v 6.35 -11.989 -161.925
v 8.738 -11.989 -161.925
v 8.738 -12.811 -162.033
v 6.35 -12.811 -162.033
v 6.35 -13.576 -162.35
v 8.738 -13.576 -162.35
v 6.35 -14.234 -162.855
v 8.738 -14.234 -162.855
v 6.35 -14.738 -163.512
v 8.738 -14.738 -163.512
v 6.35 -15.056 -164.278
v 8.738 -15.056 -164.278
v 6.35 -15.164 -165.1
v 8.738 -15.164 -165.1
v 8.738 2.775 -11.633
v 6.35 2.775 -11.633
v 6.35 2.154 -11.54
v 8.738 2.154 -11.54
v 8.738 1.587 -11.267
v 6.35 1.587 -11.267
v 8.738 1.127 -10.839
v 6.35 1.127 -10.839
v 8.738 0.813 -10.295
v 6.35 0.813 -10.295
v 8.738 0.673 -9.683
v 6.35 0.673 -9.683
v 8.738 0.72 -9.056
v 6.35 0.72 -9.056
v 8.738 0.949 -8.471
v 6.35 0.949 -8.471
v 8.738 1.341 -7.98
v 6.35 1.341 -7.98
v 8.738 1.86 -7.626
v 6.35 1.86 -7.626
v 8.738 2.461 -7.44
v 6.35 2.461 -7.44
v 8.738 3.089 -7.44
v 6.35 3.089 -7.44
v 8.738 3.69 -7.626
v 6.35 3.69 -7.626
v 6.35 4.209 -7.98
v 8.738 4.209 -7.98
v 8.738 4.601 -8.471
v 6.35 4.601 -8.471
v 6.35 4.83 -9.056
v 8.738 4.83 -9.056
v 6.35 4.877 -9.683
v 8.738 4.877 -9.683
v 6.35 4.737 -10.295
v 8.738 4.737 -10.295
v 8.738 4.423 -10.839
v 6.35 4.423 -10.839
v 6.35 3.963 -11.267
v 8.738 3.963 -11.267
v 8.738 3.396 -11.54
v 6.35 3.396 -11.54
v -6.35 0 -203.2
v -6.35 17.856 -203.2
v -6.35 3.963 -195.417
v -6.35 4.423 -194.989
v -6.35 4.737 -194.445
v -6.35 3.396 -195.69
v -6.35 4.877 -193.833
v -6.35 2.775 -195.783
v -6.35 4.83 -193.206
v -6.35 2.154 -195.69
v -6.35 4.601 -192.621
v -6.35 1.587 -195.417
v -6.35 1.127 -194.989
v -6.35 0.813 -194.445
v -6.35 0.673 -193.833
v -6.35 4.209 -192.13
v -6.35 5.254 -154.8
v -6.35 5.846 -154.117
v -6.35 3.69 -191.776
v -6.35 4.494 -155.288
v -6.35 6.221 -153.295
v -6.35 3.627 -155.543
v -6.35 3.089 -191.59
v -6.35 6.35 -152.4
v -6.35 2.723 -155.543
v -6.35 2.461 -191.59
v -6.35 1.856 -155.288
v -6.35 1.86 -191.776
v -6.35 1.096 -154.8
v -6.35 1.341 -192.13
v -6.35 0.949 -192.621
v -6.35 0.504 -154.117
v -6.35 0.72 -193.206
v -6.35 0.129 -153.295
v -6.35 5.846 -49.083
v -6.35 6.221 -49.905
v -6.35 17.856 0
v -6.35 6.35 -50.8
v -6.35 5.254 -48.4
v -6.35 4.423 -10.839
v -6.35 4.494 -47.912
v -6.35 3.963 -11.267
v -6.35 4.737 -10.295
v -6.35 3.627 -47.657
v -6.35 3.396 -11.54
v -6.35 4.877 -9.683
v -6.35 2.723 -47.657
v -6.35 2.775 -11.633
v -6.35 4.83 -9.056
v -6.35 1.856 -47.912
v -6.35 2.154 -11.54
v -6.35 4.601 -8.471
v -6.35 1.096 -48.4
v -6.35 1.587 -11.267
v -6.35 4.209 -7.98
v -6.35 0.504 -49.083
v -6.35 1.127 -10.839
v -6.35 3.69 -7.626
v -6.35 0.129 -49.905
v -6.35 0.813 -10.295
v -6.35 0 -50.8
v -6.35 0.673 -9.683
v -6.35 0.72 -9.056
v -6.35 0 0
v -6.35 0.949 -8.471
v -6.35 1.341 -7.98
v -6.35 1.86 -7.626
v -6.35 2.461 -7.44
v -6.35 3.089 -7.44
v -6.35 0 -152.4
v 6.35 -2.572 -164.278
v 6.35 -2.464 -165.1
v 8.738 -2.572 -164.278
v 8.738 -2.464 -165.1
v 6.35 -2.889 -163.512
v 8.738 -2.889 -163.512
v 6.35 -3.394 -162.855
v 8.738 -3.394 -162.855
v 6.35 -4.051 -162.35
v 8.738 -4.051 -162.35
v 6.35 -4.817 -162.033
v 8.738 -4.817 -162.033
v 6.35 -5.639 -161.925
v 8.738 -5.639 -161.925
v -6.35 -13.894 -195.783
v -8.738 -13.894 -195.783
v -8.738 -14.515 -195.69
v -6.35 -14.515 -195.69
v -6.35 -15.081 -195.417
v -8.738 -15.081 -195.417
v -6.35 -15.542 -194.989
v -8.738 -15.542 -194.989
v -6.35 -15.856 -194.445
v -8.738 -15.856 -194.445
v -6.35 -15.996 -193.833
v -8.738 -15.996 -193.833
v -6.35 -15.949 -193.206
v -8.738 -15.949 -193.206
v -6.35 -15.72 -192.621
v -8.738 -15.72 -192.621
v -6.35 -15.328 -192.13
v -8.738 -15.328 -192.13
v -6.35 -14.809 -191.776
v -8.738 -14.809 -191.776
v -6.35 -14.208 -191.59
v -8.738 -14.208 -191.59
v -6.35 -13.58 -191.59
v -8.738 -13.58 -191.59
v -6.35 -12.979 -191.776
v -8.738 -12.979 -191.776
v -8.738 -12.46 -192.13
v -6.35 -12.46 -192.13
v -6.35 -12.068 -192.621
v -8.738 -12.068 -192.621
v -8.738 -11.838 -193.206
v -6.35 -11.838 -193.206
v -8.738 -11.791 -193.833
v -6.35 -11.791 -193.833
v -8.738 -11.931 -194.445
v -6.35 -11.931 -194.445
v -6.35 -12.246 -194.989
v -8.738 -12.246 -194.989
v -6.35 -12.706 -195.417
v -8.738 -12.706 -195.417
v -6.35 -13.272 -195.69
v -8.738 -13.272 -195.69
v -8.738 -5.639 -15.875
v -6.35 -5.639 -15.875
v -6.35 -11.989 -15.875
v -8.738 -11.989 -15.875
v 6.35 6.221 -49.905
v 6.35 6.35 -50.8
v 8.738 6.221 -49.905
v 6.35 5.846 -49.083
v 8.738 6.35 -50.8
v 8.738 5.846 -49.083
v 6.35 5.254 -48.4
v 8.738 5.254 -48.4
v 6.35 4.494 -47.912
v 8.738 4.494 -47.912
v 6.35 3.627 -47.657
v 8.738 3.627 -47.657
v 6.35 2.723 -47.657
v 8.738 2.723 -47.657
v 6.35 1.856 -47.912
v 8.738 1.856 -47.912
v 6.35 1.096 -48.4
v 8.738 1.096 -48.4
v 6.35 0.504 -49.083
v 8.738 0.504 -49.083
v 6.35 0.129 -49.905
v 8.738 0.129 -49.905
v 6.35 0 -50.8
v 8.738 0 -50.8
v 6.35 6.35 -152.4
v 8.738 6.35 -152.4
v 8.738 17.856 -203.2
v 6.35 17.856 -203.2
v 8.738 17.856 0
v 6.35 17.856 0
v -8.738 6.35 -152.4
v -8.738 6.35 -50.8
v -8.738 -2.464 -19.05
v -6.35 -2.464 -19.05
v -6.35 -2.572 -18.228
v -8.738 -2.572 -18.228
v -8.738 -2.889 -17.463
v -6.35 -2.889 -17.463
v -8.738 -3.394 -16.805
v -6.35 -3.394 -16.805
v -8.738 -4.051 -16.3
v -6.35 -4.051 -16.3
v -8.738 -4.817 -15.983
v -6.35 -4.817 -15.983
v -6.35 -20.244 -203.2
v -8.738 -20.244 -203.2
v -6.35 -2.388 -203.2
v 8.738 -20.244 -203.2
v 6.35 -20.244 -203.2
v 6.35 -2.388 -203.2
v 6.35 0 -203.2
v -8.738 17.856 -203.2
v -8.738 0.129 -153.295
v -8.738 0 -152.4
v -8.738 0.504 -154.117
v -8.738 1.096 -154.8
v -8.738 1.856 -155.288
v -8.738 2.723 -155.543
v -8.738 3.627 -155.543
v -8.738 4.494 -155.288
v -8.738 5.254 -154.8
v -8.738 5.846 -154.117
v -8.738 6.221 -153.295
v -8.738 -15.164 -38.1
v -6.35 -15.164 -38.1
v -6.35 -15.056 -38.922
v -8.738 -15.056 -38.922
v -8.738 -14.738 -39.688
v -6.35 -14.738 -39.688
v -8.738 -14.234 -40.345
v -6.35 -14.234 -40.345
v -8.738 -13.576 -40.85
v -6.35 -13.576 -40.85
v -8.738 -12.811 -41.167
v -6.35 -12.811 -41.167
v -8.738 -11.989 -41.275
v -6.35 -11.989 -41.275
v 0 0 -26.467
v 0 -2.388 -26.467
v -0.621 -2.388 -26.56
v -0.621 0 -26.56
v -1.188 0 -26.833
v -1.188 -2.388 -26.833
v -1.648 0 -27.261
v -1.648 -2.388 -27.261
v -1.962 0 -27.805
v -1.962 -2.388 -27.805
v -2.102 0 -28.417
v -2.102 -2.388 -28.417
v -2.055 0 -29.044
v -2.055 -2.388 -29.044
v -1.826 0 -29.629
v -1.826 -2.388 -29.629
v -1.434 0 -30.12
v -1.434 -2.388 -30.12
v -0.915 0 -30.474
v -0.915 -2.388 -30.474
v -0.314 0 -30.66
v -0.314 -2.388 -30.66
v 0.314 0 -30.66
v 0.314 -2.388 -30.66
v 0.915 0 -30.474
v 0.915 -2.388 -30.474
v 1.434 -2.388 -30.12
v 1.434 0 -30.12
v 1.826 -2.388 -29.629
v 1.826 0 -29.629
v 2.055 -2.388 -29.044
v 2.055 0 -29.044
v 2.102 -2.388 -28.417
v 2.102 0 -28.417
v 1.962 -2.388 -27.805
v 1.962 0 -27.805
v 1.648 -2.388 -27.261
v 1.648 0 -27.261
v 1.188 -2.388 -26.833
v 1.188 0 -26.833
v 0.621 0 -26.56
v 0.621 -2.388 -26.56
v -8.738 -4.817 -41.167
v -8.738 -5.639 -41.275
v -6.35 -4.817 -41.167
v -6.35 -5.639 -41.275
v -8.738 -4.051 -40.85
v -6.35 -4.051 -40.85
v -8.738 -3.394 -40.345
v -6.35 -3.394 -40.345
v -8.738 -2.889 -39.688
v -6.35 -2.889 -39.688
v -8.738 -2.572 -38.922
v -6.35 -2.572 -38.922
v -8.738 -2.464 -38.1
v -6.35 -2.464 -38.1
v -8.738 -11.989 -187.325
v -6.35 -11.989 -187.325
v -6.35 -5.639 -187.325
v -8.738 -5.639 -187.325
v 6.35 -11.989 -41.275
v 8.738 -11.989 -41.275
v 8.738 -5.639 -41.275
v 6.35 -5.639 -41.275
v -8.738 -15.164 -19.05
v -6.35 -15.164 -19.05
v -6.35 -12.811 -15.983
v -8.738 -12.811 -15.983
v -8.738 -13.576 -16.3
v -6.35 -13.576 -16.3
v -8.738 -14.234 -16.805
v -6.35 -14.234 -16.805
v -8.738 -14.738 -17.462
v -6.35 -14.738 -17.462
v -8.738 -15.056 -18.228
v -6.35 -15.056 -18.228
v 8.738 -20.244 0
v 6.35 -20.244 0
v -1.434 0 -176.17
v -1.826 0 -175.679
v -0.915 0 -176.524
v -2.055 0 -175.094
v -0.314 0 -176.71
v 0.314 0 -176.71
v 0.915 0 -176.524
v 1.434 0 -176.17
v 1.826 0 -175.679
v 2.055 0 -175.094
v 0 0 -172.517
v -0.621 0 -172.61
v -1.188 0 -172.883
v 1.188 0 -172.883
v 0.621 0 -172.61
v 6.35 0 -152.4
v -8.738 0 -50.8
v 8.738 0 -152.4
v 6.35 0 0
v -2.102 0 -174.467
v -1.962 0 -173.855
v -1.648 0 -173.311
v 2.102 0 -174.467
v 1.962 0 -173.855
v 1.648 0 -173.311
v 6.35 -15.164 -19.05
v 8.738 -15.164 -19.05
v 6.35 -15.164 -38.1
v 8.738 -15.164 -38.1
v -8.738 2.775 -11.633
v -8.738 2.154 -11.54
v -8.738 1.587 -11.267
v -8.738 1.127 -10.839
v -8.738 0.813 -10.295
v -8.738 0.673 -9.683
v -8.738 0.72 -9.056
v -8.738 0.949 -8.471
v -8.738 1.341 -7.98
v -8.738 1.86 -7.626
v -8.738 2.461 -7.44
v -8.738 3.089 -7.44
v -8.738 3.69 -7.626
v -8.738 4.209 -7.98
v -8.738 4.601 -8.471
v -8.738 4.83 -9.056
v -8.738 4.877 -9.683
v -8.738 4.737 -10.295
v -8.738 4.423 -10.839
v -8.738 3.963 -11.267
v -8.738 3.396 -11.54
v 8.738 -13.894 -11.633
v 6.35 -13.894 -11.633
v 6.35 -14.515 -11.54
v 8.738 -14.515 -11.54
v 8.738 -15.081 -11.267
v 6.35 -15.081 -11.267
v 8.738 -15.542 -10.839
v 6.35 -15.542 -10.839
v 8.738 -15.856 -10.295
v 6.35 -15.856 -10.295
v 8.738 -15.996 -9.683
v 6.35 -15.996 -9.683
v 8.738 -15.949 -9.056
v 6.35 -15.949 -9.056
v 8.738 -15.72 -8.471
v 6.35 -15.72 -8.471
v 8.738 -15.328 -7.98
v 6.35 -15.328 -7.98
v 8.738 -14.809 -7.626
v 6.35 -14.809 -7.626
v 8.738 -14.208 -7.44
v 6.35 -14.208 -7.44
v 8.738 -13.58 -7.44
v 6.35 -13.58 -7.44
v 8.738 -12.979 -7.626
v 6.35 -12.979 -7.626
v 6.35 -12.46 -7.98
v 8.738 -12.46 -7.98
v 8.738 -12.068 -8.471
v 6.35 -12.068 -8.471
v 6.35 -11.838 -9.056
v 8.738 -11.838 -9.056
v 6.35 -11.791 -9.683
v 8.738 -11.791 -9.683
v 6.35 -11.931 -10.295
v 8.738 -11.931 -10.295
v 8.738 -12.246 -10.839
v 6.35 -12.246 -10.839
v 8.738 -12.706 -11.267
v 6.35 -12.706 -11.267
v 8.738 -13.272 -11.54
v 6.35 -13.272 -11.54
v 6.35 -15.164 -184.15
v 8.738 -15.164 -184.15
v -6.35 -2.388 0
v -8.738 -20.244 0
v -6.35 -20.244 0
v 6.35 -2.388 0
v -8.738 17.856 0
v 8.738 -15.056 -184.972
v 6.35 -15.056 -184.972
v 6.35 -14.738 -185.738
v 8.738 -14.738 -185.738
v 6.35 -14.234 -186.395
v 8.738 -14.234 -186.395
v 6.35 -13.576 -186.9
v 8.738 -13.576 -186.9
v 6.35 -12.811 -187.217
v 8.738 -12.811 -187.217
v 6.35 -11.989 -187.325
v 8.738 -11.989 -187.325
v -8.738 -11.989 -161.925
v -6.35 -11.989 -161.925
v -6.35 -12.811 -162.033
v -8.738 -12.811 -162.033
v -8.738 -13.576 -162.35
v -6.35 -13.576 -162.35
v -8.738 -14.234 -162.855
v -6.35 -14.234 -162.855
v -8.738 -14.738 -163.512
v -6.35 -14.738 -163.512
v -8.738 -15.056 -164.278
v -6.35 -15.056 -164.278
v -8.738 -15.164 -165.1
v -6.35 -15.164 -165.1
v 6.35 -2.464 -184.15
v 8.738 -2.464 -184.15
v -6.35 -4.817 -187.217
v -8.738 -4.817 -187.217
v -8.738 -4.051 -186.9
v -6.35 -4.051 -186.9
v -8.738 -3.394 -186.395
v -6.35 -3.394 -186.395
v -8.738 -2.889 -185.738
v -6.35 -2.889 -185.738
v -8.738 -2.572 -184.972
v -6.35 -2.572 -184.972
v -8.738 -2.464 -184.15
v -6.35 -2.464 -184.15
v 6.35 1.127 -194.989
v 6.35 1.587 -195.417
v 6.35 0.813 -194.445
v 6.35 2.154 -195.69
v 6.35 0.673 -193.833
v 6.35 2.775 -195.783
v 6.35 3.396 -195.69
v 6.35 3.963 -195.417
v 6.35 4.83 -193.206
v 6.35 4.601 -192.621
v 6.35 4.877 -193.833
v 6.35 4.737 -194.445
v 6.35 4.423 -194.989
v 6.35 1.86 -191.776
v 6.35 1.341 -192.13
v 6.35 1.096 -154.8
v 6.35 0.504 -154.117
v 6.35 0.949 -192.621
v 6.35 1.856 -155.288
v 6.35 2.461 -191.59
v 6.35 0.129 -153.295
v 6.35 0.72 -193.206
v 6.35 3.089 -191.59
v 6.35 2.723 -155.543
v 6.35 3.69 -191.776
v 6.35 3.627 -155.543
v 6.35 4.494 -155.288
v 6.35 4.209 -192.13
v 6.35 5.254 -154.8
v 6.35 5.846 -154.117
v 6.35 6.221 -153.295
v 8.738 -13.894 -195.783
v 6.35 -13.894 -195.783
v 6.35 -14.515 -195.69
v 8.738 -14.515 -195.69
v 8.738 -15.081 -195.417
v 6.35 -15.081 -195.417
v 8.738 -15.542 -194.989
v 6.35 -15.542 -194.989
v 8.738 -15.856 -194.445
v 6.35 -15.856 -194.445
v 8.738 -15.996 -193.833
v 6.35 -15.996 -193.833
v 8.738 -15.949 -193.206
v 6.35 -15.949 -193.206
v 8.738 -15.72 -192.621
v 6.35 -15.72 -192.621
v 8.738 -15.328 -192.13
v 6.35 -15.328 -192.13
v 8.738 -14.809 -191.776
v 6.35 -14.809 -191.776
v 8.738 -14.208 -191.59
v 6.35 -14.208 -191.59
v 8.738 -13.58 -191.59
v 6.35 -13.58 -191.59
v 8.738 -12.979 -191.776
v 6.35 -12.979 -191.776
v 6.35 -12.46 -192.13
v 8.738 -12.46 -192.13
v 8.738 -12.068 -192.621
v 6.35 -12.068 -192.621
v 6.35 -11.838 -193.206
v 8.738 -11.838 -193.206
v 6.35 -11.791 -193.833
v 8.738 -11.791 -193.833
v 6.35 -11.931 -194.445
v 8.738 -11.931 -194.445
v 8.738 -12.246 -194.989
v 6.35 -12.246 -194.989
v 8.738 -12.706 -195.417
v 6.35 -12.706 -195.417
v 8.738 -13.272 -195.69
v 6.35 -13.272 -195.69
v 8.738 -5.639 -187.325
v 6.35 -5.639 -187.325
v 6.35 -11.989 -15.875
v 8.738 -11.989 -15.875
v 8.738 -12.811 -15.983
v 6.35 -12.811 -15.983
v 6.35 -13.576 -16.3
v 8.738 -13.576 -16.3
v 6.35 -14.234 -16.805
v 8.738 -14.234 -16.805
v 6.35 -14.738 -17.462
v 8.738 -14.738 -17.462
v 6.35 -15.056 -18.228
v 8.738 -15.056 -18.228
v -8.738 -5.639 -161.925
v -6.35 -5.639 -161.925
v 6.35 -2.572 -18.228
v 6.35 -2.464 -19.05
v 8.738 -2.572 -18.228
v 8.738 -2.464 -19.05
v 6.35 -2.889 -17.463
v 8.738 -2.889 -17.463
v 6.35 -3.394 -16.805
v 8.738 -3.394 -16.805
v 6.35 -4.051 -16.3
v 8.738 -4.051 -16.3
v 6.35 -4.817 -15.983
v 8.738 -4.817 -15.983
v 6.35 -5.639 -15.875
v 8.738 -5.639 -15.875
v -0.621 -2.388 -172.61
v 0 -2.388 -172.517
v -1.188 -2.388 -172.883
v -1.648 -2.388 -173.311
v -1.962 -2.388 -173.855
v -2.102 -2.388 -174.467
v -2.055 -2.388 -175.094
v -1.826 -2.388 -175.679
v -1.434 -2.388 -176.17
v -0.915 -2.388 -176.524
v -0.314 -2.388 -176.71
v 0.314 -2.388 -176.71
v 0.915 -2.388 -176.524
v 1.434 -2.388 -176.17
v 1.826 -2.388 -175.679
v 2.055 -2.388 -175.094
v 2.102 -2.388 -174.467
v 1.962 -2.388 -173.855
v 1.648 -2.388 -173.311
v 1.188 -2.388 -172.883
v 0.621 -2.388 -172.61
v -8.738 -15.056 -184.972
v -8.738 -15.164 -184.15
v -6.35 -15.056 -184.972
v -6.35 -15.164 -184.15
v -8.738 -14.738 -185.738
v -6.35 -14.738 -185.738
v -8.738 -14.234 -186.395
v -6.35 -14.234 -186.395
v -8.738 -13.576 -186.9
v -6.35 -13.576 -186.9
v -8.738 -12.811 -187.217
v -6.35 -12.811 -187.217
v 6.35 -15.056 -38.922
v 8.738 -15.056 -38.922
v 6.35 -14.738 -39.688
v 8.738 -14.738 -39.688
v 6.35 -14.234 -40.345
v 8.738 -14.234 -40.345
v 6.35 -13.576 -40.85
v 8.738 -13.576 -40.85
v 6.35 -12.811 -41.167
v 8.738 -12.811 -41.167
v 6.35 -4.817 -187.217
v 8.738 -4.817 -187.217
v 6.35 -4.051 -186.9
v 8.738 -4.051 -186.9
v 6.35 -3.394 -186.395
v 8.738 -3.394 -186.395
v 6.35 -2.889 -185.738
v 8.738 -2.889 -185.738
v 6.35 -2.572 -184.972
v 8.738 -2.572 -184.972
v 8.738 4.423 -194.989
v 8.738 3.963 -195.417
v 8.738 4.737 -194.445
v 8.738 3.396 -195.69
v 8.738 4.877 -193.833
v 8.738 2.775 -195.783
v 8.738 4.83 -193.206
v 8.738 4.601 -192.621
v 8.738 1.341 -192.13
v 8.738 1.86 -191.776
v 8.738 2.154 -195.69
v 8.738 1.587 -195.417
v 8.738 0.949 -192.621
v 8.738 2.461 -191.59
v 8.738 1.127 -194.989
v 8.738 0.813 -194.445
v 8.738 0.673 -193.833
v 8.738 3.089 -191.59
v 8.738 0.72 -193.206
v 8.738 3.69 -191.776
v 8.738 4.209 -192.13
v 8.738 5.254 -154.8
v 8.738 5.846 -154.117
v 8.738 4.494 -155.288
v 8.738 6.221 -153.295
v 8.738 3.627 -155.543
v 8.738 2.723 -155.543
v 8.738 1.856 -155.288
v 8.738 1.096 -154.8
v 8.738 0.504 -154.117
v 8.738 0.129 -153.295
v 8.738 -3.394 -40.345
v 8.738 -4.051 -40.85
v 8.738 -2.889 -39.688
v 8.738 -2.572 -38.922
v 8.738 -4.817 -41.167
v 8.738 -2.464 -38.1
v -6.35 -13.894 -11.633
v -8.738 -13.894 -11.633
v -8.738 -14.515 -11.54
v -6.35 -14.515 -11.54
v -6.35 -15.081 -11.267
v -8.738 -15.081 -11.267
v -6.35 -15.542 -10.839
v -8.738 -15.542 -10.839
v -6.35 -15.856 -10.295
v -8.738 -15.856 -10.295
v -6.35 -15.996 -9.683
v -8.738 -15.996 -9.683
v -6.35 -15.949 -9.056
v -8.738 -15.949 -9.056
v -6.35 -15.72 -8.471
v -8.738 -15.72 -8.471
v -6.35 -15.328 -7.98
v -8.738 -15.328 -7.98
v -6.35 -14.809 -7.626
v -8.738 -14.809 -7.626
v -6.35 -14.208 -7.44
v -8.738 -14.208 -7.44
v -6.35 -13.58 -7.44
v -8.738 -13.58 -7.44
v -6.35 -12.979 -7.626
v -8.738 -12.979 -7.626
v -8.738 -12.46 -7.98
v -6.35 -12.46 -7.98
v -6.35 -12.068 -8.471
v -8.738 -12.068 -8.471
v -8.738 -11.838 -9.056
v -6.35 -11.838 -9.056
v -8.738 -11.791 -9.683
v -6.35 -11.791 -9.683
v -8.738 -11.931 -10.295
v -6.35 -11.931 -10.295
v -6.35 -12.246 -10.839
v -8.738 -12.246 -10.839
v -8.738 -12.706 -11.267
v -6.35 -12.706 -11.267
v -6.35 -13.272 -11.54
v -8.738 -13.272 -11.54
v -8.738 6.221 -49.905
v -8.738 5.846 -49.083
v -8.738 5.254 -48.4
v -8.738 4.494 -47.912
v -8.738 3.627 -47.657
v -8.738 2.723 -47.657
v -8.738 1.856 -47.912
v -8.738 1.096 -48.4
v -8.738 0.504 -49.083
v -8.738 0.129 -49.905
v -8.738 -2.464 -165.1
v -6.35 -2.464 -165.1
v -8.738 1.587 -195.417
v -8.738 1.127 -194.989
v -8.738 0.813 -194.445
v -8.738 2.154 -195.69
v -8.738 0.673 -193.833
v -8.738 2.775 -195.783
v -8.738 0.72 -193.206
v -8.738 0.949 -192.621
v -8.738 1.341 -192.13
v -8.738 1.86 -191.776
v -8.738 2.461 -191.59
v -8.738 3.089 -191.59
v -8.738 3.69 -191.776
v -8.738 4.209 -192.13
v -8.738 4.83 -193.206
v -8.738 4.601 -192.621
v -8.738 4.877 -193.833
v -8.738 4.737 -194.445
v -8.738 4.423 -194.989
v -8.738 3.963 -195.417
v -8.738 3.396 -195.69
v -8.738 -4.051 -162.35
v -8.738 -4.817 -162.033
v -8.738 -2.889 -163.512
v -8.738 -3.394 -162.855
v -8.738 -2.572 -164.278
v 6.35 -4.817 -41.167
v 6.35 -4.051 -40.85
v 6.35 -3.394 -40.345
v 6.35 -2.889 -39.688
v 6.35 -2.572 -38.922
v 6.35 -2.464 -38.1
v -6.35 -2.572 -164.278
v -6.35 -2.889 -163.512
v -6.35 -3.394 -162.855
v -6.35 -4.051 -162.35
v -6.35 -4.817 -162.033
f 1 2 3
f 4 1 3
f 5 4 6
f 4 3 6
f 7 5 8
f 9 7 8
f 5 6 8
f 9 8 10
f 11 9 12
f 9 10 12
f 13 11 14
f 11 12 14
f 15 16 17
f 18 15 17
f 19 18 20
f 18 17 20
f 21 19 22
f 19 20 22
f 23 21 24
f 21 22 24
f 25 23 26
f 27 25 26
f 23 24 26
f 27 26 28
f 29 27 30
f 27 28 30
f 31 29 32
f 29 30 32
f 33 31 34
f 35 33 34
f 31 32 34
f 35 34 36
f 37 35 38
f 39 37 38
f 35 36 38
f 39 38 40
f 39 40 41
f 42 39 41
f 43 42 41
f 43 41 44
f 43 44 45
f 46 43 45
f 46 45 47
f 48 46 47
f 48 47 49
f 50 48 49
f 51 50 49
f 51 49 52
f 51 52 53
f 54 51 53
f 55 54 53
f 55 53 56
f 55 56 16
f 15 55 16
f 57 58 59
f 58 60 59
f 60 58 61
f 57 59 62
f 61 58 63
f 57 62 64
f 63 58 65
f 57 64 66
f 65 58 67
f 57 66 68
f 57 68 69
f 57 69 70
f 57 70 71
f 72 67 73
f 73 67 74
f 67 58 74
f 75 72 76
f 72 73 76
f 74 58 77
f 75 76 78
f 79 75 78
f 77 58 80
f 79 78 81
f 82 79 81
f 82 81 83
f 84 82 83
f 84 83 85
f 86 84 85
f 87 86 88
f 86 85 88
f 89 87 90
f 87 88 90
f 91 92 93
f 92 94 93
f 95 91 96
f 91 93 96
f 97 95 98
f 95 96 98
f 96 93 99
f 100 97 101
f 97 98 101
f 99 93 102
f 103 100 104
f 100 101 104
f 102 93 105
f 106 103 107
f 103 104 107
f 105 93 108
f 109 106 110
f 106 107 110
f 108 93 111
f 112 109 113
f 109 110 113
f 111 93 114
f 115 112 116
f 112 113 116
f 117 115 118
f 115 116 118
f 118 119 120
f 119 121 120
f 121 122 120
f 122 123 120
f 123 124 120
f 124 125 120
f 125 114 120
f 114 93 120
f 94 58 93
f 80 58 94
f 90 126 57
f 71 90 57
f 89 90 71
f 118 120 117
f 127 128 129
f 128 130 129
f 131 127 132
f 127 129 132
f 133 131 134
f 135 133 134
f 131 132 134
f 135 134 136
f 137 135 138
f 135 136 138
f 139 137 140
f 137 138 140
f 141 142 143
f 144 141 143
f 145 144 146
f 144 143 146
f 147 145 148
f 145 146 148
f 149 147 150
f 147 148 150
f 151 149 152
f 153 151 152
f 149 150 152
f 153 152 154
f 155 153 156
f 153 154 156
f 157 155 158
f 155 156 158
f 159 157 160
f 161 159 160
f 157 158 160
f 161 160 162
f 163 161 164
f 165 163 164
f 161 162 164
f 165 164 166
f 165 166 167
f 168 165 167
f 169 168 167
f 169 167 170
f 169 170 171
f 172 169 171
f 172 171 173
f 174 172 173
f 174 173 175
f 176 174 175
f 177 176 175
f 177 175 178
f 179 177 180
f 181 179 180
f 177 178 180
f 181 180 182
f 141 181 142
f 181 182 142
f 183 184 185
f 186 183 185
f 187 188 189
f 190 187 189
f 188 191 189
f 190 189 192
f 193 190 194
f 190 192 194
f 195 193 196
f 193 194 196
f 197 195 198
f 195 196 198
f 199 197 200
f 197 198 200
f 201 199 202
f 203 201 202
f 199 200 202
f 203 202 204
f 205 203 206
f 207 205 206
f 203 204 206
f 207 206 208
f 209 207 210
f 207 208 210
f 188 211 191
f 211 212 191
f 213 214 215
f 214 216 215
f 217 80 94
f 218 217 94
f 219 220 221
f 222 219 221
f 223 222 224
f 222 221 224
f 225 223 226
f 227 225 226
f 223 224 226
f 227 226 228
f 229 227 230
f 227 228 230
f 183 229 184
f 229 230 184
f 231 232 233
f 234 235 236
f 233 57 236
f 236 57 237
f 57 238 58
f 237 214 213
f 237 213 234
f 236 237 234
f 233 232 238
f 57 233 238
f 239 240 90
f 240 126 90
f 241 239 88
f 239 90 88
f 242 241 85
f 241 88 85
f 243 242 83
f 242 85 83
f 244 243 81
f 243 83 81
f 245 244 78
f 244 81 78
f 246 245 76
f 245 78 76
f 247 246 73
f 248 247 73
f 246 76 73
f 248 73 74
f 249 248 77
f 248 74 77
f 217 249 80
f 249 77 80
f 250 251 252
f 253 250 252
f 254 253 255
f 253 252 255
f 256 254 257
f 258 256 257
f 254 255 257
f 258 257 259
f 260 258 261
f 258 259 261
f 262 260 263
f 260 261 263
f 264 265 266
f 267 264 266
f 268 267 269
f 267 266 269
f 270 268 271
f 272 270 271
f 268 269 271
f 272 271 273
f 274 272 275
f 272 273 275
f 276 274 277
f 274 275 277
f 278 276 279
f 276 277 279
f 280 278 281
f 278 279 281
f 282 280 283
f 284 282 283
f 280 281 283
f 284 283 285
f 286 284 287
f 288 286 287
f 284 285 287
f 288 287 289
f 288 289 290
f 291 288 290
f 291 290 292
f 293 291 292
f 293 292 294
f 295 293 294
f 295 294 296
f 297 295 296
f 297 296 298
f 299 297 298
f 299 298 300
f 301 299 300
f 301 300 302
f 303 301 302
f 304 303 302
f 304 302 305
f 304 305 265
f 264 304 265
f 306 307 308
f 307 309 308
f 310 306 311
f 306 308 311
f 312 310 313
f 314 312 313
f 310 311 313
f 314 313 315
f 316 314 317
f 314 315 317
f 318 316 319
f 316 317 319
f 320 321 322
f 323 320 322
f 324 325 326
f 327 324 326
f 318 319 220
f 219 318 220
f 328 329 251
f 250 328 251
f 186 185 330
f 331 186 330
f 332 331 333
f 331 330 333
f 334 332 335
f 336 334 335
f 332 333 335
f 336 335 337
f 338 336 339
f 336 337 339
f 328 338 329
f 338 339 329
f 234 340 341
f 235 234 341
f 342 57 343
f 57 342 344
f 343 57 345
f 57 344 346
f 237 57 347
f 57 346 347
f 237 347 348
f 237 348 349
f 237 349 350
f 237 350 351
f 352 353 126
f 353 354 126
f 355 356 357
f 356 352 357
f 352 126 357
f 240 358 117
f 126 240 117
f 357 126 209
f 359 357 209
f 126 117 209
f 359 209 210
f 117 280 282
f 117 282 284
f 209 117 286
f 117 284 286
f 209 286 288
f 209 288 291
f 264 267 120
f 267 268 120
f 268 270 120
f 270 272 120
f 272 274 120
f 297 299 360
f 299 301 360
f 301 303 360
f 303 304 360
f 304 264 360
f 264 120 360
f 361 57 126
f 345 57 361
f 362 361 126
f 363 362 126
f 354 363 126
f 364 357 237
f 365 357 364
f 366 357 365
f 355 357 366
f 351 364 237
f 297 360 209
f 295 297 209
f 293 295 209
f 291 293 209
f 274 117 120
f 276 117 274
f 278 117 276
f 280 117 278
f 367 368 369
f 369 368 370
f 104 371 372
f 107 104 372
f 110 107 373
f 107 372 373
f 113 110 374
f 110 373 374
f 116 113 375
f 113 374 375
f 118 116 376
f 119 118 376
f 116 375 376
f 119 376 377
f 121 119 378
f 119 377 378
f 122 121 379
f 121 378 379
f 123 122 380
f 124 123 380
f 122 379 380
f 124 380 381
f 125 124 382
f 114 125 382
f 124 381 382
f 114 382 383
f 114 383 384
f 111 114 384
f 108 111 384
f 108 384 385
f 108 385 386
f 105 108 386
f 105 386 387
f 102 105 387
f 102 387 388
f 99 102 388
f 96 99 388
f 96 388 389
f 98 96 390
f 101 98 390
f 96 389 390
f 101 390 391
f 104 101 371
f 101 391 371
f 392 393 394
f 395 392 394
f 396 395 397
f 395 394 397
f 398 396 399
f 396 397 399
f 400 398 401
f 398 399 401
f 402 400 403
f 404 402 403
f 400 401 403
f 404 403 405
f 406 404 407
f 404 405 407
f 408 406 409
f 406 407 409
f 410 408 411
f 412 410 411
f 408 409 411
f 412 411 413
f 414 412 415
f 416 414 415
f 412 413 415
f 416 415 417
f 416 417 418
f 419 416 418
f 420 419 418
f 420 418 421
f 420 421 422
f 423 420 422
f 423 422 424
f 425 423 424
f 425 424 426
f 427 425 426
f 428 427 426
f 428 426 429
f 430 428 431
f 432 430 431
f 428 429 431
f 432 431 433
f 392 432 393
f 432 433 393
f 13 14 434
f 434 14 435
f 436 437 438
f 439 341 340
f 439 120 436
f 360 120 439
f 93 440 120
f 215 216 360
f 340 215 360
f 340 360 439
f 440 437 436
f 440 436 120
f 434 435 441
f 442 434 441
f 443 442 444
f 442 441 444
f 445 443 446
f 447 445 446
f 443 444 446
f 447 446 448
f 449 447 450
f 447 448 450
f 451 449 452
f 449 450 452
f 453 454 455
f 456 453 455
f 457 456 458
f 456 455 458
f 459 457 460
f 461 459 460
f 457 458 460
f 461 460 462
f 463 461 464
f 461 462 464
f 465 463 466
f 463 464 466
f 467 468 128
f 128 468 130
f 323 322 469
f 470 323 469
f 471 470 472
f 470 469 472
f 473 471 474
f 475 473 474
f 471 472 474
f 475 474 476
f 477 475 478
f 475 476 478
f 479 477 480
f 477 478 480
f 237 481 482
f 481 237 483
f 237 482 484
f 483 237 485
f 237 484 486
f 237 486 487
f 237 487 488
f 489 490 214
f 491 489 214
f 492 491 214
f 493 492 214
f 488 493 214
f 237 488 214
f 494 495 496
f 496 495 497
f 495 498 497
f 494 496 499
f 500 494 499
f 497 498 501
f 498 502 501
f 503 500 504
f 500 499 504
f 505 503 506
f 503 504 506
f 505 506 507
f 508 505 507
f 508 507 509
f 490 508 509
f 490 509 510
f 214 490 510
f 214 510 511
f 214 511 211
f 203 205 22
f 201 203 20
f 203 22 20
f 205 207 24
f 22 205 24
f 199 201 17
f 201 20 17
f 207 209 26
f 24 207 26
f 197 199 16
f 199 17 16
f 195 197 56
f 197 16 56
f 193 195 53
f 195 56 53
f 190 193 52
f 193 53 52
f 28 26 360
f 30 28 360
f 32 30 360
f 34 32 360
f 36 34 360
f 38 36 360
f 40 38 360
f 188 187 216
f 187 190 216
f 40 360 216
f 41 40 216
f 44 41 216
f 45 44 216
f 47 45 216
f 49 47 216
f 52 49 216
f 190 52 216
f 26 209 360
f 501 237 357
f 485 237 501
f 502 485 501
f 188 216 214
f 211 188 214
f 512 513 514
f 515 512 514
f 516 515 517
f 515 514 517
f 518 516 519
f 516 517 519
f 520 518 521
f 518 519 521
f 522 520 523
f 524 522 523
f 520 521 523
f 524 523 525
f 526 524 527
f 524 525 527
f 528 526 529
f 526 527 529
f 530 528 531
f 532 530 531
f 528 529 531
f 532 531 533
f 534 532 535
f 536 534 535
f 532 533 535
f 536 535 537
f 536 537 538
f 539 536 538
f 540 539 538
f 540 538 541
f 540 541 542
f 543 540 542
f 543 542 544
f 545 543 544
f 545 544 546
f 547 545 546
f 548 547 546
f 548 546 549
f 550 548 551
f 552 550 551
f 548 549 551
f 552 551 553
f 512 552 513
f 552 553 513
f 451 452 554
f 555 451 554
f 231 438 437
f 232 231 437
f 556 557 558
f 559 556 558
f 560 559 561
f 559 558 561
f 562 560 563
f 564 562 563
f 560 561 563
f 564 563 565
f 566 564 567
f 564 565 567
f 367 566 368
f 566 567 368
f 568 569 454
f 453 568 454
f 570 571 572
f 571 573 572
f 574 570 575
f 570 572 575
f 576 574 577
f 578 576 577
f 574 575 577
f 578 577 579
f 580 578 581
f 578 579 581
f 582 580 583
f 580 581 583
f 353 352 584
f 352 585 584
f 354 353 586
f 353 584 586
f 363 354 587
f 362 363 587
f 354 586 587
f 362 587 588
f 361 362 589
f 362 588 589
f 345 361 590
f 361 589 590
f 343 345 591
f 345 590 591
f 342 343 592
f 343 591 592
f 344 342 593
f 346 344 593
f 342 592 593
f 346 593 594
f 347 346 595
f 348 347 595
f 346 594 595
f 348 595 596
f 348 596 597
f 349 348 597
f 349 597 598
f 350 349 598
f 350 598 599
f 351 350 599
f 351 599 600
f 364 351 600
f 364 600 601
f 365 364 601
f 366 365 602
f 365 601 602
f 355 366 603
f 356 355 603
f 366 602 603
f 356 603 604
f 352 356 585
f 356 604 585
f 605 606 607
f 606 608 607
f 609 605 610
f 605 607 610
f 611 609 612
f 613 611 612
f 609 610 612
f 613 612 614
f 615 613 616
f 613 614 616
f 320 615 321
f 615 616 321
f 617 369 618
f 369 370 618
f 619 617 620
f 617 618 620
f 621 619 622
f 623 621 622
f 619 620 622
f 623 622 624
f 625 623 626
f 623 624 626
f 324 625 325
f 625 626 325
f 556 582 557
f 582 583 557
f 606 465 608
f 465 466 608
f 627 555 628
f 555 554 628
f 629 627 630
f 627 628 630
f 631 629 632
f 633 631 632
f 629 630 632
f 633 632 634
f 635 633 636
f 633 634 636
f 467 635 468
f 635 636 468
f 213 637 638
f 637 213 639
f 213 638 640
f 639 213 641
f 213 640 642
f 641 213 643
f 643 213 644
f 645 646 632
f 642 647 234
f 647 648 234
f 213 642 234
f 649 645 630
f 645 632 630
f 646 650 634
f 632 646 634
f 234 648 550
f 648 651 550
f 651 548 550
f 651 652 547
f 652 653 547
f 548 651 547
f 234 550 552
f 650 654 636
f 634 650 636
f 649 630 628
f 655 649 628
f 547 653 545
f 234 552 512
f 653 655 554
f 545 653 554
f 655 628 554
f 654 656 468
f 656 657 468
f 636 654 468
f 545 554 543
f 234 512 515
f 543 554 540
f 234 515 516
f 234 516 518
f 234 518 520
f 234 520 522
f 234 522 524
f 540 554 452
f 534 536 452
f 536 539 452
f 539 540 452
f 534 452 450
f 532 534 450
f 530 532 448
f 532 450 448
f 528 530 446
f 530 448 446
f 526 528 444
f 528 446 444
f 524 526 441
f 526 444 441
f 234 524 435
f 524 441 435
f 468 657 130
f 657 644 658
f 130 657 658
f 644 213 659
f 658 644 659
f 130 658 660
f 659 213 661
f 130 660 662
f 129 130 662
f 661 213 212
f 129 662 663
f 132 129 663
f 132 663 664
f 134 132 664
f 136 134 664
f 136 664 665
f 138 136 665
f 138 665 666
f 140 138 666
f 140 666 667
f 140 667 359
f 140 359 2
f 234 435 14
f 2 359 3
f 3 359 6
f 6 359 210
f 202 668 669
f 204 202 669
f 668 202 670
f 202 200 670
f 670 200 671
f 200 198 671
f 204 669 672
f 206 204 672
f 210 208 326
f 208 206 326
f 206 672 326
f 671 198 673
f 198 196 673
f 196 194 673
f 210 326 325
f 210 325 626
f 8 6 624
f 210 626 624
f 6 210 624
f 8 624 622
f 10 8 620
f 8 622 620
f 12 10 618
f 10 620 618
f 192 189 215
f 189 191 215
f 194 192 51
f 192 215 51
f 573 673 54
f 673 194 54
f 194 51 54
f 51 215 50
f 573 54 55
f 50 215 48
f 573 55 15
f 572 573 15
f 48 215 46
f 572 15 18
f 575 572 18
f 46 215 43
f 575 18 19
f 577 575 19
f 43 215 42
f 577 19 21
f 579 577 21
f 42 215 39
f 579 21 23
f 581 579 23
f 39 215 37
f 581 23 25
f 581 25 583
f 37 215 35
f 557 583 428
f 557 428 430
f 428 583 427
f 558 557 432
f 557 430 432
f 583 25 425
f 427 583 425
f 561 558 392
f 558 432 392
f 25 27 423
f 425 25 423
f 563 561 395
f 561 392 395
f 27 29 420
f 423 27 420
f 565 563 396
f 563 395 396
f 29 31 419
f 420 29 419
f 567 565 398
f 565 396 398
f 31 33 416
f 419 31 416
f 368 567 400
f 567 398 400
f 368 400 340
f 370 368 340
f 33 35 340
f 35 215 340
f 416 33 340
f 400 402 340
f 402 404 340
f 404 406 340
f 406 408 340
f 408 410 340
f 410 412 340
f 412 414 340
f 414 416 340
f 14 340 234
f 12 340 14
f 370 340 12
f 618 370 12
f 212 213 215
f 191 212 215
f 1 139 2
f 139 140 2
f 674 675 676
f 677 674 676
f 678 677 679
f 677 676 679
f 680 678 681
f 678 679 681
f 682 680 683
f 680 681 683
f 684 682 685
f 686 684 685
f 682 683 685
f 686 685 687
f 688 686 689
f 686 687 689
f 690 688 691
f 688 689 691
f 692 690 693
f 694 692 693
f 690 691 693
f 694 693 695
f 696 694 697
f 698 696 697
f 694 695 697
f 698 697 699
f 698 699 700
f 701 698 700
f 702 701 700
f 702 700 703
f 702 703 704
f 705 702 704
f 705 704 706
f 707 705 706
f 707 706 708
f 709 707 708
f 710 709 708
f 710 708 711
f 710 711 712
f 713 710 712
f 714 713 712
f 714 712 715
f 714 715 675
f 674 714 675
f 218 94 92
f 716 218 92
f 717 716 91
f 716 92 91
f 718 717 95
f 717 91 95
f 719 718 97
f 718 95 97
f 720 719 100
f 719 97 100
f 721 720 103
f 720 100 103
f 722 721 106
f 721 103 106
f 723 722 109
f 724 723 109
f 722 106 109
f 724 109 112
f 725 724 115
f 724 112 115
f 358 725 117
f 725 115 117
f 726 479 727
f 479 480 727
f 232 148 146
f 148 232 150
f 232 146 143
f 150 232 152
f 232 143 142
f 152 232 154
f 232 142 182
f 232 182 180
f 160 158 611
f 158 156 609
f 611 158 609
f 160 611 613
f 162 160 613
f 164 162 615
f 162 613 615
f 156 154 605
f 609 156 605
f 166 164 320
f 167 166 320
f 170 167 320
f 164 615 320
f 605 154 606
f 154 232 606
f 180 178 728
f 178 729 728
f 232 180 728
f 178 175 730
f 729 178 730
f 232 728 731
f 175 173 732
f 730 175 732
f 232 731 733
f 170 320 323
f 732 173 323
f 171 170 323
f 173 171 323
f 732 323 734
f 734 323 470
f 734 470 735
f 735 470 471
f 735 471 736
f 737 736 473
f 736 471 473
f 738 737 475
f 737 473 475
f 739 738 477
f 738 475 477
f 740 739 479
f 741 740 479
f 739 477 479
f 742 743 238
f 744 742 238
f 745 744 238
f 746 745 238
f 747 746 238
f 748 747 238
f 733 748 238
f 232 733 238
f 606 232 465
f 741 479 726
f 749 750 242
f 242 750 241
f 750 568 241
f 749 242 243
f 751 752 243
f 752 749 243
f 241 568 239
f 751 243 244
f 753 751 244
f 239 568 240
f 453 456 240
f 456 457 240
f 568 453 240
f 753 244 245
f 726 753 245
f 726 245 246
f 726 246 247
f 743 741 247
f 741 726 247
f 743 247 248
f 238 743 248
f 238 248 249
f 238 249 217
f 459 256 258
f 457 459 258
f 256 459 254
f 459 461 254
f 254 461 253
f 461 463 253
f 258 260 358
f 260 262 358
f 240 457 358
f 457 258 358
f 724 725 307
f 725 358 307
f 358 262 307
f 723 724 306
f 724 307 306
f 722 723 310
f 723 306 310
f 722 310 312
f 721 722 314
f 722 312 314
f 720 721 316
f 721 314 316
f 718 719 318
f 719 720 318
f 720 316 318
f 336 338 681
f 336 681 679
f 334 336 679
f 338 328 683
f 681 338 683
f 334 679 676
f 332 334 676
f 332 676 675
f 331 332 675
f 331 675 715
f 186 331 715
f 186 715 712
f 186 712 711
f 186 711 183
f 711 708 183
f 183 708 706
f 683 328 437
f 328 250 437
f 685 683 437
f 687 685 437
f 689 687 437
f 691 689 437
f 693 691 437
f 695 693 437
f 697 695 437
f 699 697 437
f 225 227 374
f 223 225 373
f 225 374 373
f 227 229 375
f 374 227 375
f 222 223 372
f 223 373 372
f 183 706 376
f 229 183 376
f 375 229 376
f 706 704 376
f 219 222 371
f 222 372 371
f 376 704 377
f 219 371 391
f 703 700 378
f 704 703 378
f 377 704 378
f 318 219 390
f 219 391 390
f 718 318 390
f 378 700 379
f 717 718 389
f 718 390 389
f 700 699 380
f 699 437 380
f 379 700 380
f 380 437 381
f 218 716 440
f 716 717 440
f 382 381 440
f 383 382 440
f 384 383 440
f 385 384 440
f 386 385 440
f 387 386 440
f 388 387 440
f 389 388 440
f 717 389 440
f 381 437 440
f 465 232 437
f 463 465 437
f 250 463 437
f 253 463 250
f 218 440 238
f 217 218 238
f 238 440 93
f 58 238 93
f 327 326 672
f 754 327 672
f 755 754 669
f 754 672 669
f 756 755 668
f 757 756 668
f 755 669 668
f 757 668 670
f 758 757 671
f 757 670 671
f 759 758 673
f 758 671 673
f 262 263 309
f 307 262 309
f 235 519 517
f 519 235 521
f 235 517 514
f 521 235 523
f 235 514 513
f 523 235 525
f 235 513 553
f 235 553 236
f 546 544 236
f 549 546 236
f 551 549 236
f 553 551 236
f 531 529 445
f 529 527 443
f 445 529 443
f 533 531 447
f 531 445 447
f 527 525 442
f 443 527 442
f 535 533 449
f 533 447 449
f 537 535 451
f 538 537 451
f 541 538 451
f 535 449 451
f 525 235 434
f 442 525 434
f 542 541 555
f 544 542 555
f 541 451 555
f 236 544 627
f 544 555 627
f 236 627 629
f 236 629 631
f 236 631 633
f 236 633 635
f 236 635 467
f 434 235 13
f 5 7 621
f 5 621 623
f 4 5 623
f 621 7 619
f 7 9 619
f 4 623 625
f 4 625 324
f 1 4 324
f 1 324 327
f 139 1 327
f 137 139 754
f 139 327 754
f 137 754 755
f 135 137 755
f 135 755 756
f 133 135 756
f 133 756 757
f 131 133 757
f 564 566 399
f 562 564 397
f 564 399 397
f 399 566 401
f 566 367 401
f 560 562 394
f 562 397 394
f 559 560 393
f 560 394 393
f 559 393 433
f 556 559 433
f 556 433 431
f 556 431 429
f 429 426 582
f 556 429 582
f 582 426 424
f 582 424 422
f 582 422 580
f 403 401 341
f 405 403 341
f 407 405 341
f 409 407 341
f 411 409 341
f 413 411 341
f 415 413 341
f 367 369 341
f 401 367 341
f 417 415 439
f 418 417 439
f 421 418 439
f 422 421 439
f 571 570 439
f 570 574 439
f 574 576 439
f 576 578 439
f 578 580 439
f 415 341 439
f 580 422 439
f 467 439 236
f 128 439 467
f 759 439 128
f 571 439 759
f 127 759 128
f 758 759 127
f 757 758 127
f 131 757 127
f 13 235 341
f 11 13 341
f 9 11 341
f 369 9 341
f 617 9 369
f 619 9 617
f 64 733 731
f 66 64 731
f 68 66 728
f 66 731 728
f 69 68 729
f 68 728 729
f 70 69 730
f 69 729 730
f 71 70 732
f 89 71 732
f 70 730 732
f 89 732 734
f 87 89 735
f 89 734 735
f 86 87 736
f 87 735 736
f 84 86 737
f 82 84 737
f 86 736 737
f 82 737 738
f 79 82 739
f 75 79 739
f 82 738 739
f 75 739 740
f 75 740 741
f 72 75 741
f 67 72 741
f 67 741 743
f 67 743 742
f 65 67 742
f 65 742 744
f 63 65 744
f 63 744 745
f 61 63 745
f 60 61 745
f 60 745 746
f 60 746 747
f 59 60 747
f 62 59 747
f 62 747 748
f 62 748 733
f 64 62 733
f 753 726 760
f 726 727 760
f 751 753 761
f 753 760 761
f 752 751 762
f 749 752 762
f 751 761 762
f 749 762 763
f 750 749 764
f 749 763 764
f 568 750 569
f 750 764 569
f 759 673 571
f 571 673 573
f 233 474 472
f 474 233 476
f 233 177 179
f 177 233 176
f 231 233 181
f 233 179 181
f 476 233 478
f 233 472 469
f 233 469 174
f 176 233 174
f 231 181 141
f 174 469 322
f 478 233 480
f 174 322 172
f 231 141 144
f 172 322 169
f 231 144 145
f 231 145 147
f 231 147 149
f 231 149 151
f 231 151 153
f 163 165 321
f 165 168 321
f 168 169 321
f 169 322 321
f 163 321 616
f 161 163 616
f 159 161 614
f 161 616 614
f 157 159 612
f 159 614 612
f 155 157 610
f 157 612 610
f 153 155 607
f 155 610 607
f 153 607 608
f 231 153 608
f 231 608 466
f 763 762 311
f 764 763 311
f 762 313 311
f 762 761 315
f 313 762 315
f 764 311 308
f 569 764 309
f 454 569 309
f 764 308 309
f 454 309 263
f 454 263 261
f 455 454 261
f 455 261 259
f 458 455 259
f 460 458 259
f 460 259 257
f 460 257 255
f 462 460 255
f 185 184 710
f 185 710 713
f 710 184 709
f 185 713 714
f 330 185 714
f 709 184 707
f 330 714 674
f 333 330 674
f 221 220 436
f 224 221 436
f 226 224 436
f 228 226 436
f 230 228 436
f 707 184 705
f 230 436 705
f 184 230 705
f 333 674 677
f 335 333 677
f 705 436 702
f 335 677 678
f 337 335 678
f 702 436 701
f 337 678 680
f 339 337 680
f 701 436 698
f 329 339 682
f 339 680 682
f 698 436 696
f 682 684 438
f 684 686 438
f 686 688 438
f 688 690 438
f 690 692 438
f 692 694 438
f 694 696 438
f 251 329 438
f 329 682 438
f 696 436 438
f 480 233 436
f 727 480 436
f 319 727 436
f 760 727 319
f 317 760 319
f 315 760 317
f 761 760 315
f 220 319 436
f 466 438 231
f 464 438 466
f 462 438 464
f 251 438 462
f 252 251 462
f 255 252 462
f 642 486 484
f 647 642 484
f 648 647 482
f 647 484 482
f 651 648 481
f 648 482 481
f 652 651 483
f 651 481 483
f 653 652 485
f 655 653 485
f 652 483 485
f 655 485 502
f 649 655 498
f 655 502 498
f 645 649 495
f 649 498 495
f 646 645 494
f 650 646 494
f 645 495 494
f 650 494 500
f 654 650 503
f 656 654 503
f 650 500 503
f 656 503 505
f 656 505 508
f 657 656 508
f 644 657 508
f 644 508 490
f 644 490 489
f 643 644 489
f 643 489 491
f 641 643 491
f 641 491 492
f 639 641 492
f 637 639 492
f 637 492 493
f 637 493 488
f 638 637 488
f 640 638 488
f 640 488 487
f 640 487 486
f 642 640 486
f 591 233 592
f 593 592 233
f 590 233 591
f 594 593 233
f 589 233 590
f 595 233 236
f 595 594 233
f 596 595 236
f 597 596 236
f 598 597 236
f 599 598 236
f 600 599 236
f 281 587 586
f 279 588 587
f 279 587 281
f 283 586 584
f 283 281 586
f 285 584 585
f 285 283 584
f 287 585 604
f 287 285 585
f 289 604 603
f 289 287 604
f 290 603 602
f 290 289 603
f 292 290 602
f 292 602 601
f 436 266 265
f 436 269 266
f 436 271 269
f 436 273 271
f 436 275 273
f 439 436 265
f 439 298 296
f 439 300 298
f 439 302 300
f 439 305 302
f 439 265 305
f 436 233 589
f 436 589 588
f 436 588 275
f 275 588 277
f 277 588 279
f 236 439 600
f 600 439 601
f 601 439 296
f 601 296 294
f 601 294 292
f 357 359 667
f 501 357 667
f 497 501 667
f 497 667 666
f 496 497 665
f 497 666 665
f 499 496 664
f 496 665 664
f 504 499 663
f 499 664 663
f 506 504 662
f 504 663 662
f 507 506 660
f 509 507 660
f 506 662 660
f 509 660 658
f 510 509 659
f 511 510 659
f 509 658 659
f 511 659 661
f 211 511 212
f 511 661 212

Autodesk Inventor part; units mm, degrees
ref_plane "YZ Plane" through (0, 0, 0) normal (1, 0, 0) x (0, 1, 0)
ref_plane "XZ Plane" through (0, 0, 0) normal (0, 1, 0) x (-1, 0, 0)
ref_plane "XY Plane" through (0, 0, 0) normal (0, 0, 1) x (1, 0, 0)
sketch "Sketch1" plane through (0, 0, 0) normal (0, 0, 1) x (1, 0, 0)
  line L0 (-6.35, 0) -> (6.35, 0)
  line L1 (-6.35, -2.3876) -> (6.35, -2.3876)
  line L2 (6.35, 0) -> (6.35, 17.8562)
  line L3 (6.35, 17.8562) -> (8.7376, 17.8562)
  line L4 (8.7376, 17.8562) -> (8.7376, -20.2438)
  line L5 (8.7376, -20.2438) -> (6.35, -20.2438)
  line L6 (6.35, -20.2438) -> (6.35, -2.3876)
  line L7 (-6.35, -2.3876) -> (-6.35, -20.2438)
  line L8 (-6.35, -20.2438) -> (-8.7376, -20.2438)
  line L9 (-8.7376, -20.2438) -> (-8.7376, 17.8562)
  line L10 (-8.7376, 17.8562) -> (-6.35, 17.8562)
  line L11 (-6.35, 17.8562) -> (-6.35, 0)
  point P0 (0, 0)
  point P1 (0, 0)
  dimension "d9" = 12.7
  dimension "d10" = 2.3876
  dimension "d11" = 17.8562
  dimension "d12" = 38.1
  dimension "d13" = 2.3876
  dimension "d14" = 2.3876
  dimension "d15" = 2.3876
  dimension "d16" = 17.8562
  dimension "d17" = 17.8562
extrude "Extrusion1" add sketch "Sketch1" against normal blind 203.2
sketch "Sketch2" plane through (8.7376, -20.2438, 0) normal (1, 0, 0) x (0, 0, -1)
  point P0 (0, 0)
  point P1 (9.525, 6.35)
  dimension "d20" = 9.525
  dimension "d21" = 6.35
hole "Hole1" at (8.7376, -13.8938, -9.525) direction (-1, 0, 0) diameter 4.2164 end through all
sketch "Sketch3" plane through (8.7376, -20.2438, 0) normal (1, 0, 0) x (0, 0, -1)
  point P0 (0, 38.1)
  point P1 (9.525, 23.0188)
  dimension "d29" = 15.0813
  dimension "d30" = 9.525
hole "Hole2" at (8.7376, 2.775, -9.525) direction (-1, 0, 0) diameter 4.2164 end through all
sketch "Sketch4" plane through (8.7376, -20.2438, 0) normal (1, 0, 0) x (0, 0, -1)
  circle A0 centre (9.525, 23.0188) radius 2.1082 projected
  circle A1 centre (9.525, 6.35) radius 2.1082 projected
  line L0 (0, 0) -> (203.2, 0) projected
  line L1 (0, 38.1) -> (203.2, 38.1) projected
  line L2 (101.6, 38.1) -> (101.6, 0) construction
  circle A2 centre (193.675, 23.0188) radius 2.1082
  circle A3 centre (193.675, 6.35) radius 2.1082
hole "Hole3" at (8.7376, 2.775, -193.675) at (8.7376, -13.8938, -193.675) direction (-1, 0, 0) diameter 4.2164 end through all
sketch "Sketch5" plane through (8.7376, -20.2438, 0) normal (1, 0, 0) x (0, 0, -1)
  line L0 (19.05, 5.08) -> (38.1, 5.08)
  line L1 (41.275, 8.255) -> (41.275, 14.605)
  line L2 (38.1, 17.78) -> (19.05, 17.78)
  line L3 (15.875, 14.605) -> (15.875, 8.255)
  arc A0 (19.05, 17.78) -> (15.875, 14.605) centre (19.05, 14.605) ccw
  arc A1 (41.275, 14.605) -> (38.1, 17.78) centre (38.1, 14.605) ccw
  arc A2 (38.1, 5.08) -> (41.275, 8.255) centre (38.1, 8.255) ccw
  arc A3 (15.875, 8.255) -> (19.05, 5.08) centre (19.05, 8.255) ccw
  point P0 (0, 0)
  point P1 (41.275, 17.78)
  point P2 (41.275, 5.08)
  point P3 (15.875, 17.78)
  point P4 (28.575, 17.78)
  point P5 (28.575, 17.78)
  dimension "d45" = 25.4
  dimension "d46" = 12.7
  dimension "d47" = 17.78
  dimension "d48" = 28.575
  dimension "d49" = 3.175
extrude "Extrusion2" cut sketch "Sketch5" against normal through all
sketch "Sketch6" plane through (8.7376, -20.2438, 0) normal (1, 0, 0) x (0, 0, -1)
  arc A0 (19.05, 17.78) -> (15.875, 14.605) centre (19.05, 14.605) ccw projected
  arc A1 (41.275, 14.605) -> (38.1, 17.78) centre (38.1, 14.605) ccw projected
  arc A2 (38.1, 5.08) -> (41.275, 8.255) centre (38.1, 8.255) ccw projected
  arc A3 (15.875, 8.255) -> (19.05, 5.08) centre (19.05, 8.255) ccw projected
  line L0 (101.6, 38.1) -> (101.6, 0) construction
  arc A4 (187.325, 14.605) -> (184.15, 17.78) centre (184.15, 14.605) ccw
  line L1 (184.15, 17.78) -> (165.1, 17.78)
  arc A5 (165.1, 17.78) -> (161.925, 14.605) centre (165.1, 14.605) ccw
  line L2 (161.925, 14.605) -> (161.925, 8.255)
  arc A6 (161.925, 8.255) -> (165.1, 5.08) centre (165.1, 8.255) ccw
  line L3 (165.1, 5.08) -> (184.15, 5.08)
  arc A7 (184.15, 5.08) -> (187.325, 8.255) centre (184.15, 8.255) ccw
  line L4 (187.325, 8.255) -> (187.325, 14.605)
extrude "Extrusion3" cut sketch "Sketch6" against normal through all
sketch "Sketch7" plane through (-6.35, 0, 0) normal (0, 1, 0) x (1, 0, 0)
  line L0 (15.0876, 19.05) -> (15.0876, 38.1) projected
  line L1 (-2.3876, 38.1) -> (-2.3876, 19.05) projected
  line L2 (-2.3876, 28.575) -> (15.0876, 28.575) construction
  line L3 (-2.3876, 28.575) -> (6.35, 28.575) construction
  dimension "d54" = 17.4752
hole "Hole4" at (0, 0, -28.575) direction (0, -1, 0) diameter 4.2164 end through all
sketch "Sketch8" plane through (-6.35, 0, 0) normal (0, 1, 0) x (1, 0, 0)
  circle A0 centre (6.35, 28.575) radius 2.1082 projected
  line L0 (0, 0) -> (0, 203.2) projected
  line L1 (15.0876, 101.6) -> (-2.2502, 101.6)
  circle A1 centre (6.35, 174.625) radius 2.1082
hole "Hole5" at (0, 0, -174.625) direction (0, -1, 0) diameter 4.2164 end through all
sketch "Sketch9" plane through (8.7376, -20.2438, 0) normal (1, 0, 0) x (0, 0, -1)
  line L0 (0, 20.2438) -> (203.2, 20.2438) projected
  line L1 (101.6, 38.1) -> (101.6, 0) construction
  line L2 (50.8, 20.2438) -> (152.4, 20.2438)
  line L3 (155.575, 23.4188) -> (155.575, 23.4188)
  line L4 (152.4, 26.5938) -> (50.8, 26.5938)
  line L5 (47.625, 23.4188) -> (47.625, 23.4188)
  arc A0 (50.8, 26.5938) -> (47.625, 23.4188) centre (50.8, 23.4188) ccw
  arc A1 (47.625, 23.4188) -> (50.8, 20.2438) centre (50.8, 23.4188) ccw
  arc A2 (155.575, 23.4188) -> (152.4, 26.5938) centre (152.4, 23.4188) ccw
  arc A3 (152.4, 20.2438) -> (155.575, 23.4188) centre (152.4, 23.4188) ccw
  point P0 (155.575, 26.5938)
  point P1 (155.575, 20.2438)
  point P2 (47.625, 26.5938)
  point P3 (101.6, 20.2438)
  dimension "d69" = 107.95
  dimension "d70" = 6.35
  dimension "d71" = 3.175
extrude "Extrusion4" cut sketch "Sketch9" against normal through all
equation "\"d13\" = d10"
equation "\"d14\" = d10"
equation "\"d15\" = d10"
equation "\"d16\" = d11"
equation "\"d17\" = d11"
properties part number "car frame"
